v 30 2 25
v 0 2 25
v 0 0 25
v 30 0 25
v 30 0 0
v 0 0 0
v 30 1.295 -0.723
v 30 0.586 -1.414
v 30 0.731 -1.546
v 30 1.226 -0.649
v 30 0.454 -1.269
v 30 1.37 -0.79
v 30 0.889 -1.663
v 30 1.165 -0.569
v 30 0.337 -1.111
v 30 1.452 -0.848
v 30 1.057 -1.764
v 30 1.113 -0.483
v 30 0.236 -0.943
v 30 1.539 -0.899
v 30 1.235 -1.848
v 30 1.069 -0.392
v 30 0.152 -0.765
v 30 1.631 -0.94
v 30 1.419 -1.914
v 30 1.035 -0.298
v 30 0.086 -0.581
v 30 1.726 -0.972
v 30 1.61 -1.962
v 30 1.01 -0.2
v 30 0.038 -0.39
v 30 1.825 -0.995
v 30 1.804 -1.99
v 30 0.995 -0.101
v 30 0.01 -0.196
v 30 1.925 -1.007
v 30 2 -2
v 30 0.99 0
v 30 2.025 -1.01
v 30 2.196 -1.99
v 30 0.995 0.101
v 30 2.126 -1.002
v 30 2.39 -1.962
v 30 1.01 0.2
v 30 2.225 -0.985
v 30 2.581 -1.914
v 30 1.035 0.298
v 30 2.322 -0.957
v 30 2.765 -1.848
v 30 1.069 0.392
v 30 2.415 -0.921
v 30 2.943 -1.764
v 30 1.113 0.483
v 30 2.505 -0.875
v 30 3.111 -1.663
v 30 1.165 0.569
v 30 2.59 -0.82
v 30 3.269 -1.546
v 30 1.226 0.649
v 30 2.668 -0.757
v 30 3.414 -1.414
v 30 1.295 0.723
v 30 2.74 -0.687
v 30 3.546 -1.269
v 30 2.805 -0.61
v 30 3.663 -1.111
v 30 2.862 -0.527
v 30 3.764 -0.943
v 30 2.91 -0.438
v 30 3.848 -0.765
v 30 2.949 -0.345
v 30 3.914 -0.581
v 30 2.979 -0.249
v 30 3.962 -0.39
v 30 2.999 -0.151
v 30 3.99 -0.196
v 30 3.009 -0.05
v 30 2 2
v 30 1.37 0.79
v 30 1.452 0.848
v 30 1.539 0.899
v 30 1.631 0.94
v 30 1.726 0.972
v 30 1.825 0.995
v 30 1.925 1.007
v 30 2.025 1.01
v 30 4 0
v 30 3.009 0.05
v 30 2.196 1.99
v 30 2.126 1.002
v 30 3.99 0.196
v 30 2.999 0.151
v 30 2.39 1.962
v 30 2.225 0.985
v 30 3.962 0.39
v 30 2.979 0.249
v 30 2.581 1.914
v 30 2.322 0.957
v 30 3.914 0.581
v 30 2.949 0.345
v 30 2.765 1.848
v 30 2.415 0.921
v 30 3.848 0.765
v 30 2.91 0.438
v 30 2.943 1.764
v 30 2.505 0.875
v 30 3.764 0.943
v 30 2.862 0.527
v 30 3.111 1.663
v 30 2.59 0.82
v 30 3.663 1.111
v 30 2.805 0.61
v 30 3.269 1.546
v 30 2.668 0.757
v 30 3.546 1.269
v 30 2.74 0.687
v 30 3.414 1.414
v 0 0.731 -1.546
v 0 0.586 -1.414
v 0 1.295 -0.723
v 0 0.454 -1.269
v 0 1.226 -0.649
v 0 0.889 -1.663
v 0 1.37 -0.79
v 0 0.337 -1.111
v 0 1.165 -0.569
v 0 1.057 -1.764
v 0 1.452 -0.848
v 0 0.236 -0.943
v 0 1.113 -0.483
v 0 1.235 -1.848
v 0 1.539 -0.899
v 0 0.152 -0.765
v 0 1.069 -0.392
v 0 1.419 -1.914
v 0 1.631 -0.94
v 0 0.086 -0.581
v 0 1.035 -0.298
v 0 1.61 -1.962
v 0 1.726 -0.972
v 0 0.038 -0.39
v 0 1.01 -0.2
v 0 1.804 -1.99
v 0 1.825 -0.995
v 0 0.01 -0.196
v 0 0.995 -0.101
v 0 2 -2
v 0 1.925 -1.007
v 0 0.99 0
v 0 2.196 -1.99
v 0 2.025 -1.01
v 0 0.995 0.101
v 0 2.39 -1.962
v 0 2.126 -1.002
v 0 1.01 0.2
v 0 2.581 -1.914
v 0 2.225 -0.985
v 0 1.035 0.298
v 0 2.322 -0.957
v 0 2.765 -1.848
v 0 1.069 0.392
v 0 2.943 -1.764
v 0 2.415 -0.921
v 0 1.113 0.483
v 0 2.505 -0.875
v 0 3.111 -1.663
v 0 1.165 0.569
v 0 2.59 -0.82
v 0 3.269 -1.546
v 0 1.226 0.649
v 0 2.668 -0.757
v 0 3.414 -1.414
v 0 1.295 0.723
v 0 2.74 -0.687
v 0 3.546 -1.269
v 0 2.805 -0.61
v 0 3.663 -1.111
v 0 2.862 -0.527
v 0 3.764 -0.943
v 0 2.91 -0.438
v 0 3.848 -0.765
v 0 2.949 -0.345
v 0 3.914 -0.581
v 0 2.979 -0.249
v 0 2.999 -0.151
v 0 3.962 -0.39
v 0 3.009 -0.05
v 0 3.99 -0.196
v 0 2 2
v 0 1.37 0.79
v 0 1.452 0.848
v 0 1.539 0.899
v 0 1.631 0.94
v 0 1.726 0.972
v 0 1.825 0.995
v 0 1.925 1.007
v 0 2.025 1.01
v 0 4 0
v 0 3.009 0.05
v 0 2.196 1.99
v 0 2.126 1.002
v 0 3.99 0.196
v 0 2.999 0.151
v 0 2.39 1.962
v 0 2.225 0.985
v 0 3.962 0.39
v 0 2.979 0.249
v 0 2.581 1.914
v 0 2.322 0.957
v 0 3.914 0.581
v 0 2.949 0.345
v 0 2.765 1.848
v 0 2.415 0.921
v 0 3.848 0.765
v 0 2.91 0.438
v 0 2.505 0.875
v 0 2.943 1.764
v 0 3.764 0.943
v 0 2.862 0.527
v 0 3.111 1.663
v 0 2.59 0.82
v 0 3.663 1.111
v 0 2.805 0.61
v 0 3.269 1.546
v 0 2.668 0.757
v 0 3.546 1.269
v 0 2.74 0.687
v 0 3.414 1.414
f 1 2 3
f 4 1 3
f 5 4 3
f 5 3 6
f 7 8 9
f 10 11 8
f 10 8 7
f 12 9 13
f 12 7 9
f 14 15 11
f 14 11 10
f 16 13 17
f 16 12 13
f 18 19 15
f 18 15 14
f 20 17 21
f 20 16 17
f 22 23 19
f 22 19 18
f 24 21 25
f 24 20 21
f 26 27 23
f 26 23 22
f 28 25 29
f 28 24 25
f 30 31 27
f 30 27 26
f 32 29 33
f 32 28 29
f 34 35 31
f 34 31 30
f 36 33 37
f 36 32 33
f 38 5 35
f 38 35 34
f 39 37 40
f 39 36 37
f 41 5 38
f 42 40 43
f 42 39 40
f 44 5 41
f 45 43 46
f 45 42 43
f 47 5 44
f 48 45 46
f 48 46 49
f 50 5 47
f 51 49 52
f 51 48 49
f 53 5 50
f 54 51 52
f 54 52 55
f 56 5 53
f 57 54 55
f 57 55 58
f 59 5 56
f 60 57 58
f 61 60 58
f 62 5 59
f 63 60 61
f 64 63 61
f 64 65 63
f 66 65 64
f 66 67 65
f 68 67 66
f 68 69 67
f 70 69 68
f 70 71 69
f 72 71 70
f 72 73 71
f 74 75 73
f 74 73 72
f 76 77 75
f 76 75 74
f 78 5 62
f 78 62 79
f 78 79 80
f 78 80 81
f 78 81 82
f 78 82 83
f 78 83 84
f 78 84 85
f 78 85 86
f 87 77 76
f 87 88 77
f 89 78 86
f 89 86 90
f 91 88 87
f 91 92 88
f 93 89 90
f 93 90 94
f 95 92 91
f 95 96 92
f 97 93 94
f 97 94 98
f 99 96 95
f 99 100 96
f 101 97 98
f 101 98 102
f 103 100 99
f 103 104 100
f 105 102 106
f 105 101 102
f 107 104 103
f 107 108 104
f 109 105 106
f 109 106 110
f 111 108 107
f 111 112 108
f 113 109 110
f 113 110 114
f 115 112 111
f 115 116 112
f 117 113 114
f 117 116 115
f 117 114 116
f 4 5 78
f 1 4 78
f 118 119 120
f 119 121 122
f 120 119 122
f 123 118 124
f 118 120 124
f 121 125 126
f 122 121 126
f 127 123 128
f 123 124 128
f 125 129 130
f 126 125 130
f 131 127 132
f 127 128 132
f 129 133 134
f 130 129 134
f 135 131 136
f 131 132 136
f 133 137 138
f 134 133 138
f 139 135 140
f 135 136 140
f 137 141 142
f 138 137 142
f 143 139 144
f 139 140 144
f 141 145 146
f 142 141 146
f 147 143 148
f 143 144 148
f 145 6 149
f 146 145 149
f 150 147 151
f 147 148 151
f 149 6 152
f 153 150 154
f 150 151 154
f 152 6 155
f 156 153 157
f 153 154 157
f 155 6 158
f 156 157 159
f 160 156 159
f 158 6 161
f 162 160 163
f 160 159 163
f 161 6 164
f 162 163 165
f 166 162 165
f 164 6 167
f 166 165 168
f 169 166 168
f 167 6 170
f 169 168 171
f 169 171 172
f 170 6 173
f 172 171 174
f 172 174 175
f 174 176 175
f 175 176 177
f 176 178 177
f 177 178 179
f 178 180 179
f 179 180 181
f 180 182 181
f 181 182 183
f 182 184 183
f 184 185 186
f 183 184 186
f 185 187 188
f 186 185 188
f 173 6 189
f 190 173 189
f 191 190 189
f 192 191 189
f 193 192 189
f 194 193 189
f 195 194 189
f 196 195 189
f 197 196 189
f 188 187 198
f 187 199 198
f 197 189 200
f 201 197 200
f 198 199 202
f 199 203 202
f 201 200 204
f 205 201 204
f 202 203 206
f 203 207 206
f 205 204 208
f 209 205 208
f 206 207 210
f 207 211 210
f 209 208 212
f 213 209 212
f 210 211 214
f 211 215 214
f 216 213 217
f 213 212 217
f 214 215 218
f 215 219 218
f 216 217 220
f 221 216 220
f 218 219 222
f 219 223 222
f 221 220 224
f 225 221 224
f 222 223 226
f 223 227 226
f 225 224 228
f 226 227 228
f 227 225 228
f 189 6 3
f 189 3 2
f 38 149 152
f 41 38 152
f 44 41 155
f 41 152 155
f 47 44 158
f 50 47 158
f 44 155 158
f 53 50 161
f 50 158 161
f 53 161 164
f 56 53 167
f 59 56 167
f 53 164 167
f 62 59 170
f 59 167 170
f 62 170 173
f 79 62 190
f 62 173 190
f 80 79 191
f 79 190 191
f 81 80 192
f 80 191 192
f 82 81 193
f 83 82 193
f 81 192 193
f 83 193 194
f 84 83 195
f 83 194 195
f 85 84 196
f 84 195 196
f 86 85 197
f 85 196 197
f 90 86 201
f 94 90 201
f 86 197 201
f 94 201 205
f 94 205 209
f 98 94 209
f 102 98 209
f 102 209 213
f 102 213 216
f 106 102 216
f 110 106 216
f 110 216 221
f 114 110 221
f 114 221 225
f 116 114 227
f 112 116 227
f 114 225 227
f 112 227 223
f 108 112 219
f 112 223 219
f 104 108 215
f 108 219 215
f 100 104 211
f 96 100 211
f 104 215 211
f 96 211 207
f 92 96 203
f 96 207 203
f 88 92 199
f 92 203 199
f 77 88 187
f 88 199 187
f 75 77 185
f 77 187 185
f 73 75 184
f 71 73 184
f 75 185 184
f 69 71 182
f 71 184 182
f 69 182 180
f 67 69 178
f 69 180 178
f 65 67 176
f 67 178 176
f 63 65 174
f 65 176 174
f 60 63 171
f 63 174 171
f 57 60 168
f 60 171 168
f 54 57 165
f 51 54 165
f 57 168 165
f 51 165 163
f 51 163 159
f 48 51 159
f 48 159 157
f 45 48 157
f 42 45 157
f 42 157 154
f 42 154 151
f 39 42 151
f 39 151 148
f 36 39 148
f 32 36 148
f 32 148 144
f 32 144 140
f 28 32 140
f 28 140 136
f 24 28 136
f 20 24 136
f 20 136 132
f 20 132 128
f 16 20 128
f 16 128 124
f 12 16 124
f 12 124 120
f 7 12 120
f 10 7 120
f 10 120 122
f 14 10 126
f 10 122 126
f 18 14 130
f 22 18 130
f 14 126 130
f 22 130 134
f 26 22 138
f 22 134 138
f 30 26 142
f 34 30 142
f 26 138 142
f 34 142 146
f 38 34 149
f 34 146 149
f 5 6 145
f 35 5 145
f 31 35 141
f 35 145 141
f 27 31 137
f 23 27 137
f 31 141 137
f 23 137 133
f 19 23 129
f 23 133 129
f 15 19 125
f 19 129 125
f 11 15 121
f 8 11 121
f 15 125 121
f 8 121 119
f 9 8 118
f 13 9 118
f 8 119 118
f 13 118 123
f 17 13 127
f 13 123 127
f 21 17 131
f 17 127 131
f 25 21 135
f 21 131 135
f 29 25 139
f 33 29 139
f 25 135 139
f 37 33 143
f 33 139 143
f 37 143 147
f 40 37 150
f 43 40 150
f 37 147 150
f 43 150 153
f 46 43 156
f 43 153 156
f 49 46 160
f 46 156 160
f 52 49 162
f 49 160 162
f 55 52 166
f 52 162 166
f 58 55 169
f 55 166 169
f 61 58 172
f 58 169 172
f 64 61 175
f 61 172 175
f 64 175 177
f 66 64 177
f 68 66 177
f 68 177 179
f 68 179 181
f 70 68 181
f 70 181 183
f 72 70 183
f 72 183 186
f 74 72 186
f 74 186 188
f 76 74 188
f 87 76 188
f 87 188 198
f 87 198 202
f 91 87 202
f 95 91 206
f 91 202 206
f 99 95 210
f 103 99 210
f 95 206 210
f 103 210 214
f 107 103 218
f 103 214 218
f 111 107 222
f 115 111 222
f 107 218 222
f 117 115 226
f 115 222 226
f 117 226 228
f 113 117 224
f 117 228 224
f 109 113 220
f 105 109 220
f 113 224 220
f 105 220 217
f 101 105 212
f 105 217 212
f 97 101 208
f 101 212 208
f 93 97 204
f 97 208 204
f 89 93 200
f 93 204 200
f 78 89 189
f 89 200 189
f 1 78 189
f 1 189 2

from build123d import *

# Parameters (mm, degrees)
F2_DEPTH = 30


# Not quite as in the source:
# - a feature of the source that left no trace in its solid (it failed there, or was rolled back) is left out


with BuildPart() as f2:
    # F1 (on Right) → F2 (new body)
    with BuildSketch(Plane.YZ):
        with BuildLine():
            Line((0, 25), (0, 0))
            ThreePointArc((0, 0), (3.4142135624, -1.4142135624), (2, 2))
            Line((2, 2), (2, 25))
            Line((2, 25), (0, 25))
        make_face()
        with BuildLine():
            ThreePointArc((3.01, 0), (2, -1.01), (0.99, 0))
            ThreePointArc((0.99, 0), (2, 1.01), (3.01, 0))
        make_face(mode=Mode.SUBTRACT)
    extrude(amount=F2_DEPTH)


solid = f2.part
